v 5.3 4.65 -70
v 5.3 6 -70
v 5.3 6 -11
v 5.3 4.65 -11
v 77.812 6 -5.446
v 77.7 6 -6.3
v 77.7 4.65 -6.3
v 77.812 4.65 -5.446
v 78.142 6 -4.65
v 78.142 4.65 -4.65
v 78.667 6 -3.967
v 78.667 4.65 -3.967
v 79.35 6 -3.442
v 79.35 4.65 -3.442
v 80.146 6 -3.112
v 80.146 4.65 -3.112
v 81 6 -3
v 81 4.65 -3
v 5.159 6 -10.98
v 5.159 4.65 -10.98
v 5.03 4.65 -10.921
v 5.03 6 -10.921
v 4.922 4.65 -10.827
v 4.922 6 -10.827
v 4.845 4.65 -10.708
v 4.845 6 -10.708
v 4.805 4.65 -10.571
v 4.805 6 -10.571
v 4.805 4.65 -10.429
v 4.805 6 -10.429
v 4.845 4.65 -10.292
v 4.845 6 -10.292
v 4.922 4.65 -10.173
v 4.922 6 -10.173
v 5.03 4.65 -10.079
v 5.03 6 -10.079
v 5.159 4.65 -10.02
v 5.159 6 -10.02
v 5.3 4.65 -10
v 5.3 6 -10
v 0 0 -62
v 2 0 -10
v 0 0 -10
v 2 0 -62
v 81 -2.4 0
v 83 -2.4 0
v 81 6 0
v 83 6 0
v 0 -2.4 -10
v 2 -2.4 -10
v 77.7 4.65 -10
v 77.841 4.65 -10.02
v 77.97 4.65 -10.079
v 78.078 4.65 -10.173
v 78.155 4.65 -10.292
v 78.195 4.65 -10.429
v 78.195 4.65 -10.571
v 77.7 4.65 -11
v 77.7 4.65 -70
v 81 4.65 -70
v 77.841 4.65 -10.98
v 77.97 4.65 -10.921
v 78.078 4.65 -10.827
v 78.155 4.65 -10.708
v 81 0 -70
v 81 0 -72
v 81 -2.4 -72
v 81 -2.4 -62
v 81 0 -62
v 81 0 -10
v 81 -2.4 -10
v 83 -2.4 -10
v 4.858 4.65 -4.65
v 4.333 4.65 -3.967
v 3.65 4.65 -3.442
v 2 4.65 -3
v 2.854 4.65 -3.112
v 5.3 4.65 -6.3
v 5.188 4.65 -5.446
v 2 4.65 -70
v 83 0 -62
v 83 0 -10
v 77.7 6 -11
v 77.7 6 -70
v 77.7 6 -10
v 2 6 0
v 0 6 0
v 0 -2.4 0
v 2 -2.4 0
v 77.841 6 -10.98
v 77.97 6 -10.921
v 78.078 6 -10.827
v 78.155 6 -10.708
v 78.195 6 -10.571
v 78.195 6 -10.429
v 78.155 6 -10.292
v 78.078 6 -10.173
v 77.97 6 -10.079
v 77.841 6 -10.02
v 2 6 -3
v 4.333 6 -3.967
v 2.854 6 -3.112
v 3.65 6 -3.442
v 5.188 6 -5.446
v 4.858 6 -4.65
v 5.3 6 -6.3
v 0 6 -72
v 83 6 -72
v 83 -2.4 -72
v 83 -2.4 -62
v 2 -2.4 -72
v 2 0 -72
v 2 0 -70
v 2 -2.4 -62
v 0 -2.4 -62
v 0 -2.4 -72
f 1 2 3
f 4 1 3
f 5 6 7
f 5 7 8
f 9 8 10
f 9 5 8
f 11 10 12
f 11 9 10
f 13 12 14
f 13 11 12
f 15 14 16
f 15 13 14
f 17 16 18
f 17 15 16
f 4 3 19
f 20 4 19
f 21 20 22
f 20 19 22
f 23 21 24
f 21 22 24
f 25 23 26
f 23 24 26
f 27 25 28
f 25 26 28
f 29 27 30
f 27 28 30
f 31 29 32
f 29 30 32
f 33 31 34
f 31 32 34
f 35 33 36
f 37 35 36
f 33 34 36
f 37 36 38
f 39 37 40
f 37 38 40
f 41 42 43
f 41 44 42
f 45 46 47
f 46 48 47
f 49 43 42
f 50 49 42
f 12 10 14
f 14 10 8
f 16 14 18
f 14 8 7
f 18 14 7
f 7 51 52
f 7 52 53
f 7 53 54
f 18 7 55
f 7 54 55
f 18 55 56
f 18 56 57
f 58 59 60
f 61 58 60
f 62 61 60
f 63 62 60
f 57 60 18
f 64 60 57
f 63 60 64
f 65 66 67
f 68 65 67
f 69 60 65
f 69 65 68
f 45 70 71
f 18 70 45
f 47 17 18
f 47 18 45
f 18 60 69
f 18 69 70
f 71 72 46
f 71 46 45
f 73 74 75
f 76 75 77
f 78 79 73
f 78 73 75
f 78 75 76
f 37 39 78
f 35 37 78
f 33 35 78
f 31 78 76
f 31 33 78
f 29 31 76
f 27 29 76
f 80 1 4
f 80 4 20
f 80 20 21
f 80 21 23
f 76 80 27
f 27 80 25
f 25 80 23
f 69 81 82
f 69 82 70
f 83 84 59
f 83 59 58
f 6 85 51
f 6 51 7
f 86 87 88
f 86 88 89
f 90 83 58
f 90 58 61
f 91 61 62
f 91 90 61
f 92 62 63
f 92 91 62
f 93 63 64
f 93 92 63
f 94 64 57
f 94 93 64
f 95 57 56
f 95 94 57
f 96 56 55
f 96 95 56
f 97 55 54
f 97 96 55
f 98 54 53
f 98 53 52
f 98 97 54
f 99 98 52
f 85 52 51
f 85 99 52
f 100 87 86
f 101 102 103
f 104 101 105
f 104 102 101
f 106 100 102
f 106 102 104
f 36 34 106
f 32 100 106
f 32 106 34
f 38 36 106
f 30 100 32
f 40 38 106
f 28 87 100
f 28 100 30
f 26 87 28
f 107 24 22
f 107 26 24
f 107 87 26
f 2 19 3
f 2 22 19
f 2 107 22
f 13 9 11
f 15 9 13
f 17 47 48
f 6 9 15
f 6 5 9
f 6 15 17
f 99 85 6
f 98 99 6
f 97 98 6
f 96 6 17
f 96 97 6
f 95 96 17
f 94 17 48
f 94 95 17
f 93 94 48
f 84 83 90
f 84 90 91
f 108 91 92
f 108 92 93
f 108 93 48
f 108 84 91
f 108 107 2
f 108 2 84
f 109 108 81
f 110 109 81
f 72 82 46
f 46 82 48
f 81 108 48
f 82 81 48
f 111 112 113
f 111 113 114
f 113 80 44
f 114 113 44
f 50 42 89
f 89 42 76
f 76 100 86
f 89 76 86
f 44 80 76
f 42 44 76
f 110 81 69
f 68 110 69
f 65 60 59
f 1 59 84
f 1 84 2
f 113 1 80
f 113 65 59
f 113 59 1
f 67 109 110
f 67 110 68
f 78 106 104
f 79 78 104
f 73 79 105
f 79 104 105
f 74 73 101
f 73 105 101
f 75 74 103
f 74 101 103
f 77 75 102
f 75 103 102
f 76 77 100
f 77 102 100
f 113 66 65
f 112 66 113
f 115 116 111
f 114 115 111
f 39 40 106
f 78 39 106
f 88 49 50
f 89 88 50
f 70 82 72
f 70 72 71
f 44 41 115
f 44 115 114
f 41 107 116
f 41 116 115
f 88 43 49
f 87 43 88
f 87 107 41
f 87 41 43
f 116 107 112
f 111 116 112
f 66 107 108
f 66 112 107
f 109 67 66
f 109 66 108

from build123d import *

# Parameters (mm, degrees)
BOSS_EXTRUDE1_DEPTH = 6
BOSS_EXTRUDE2_DEPTH = 1.35
SKETCH3_W           = 2
SKETCH3_H           = 10
BOSS_EXTRUDE3_DEPTH = 2.4


with BuildPart() as part:
    # Sketch1 → Boss-Extrude1 (new body)
    with BuildSketch(Plane(origin=(0, 0, 0), x_dir=(1, 0, 0), z_dir=(0, 1, 0))):
        Polygon((0, 0), (0, 72), (83, 72), (83, 0), (81, 0), (81, 70), (2, 70), (2, 0), align=None)
    extrude(amount=BOSS_EXTRUDE1_DEPTH)

    # Sketch2 → Boss-Extrude2 (add)
    with BuildSketch(Plane(origin=(0, 6, 0), x_dir=(1, 0, 0), z_dir=(0, 1, 0))):
        with BuildLine():
            Line((2, 3), (2, 70))
            Line((2, 70), (5.3, 70))
            Line((5.3, 70), (5.3, 11))
            ThreePointArc((5.3, 11), (4.8, 10.5), (5.3, 10))
            Line((5.3, 10), (5.3, 6.3))
            ThreePointArc((5.3, 6.3), (4.333452378, 3.966547622), (2, 3))
        make_face()
    boss_extrude2 = extrude(amount=-BOSS_EXTRUDE2_DEPTH)

    # Sketch3 → Boss-Extrude3 (add)
    with BuildSketch(Plane.XZ):
        with Locations((1, -5)):
            Rectangle(SKETCH3_W, SKETCH3_H)
        with Locations((1, -67)):
            Rectangle(SKETCH3_W, SKETCH3_H)
    boss_extrude3 = extrude(amount=BOSS_EXTRUDE3_DEPTH)

    # Mirror1: Boss-Extrude2, Boss-Extrude3 across plane
    add(boss_extrude2.mirror(Plane(origin=(41.5, 0, 0), x_dir=(0, 0, 1), z_dir=(1, 0, 0))))
    add(boss_extrude3.mirror(Plane(origin=(41.5, 0, 0), x_dir=(0, 0, 1), z_dir=(1, 0, 0))))


solid = part.part
